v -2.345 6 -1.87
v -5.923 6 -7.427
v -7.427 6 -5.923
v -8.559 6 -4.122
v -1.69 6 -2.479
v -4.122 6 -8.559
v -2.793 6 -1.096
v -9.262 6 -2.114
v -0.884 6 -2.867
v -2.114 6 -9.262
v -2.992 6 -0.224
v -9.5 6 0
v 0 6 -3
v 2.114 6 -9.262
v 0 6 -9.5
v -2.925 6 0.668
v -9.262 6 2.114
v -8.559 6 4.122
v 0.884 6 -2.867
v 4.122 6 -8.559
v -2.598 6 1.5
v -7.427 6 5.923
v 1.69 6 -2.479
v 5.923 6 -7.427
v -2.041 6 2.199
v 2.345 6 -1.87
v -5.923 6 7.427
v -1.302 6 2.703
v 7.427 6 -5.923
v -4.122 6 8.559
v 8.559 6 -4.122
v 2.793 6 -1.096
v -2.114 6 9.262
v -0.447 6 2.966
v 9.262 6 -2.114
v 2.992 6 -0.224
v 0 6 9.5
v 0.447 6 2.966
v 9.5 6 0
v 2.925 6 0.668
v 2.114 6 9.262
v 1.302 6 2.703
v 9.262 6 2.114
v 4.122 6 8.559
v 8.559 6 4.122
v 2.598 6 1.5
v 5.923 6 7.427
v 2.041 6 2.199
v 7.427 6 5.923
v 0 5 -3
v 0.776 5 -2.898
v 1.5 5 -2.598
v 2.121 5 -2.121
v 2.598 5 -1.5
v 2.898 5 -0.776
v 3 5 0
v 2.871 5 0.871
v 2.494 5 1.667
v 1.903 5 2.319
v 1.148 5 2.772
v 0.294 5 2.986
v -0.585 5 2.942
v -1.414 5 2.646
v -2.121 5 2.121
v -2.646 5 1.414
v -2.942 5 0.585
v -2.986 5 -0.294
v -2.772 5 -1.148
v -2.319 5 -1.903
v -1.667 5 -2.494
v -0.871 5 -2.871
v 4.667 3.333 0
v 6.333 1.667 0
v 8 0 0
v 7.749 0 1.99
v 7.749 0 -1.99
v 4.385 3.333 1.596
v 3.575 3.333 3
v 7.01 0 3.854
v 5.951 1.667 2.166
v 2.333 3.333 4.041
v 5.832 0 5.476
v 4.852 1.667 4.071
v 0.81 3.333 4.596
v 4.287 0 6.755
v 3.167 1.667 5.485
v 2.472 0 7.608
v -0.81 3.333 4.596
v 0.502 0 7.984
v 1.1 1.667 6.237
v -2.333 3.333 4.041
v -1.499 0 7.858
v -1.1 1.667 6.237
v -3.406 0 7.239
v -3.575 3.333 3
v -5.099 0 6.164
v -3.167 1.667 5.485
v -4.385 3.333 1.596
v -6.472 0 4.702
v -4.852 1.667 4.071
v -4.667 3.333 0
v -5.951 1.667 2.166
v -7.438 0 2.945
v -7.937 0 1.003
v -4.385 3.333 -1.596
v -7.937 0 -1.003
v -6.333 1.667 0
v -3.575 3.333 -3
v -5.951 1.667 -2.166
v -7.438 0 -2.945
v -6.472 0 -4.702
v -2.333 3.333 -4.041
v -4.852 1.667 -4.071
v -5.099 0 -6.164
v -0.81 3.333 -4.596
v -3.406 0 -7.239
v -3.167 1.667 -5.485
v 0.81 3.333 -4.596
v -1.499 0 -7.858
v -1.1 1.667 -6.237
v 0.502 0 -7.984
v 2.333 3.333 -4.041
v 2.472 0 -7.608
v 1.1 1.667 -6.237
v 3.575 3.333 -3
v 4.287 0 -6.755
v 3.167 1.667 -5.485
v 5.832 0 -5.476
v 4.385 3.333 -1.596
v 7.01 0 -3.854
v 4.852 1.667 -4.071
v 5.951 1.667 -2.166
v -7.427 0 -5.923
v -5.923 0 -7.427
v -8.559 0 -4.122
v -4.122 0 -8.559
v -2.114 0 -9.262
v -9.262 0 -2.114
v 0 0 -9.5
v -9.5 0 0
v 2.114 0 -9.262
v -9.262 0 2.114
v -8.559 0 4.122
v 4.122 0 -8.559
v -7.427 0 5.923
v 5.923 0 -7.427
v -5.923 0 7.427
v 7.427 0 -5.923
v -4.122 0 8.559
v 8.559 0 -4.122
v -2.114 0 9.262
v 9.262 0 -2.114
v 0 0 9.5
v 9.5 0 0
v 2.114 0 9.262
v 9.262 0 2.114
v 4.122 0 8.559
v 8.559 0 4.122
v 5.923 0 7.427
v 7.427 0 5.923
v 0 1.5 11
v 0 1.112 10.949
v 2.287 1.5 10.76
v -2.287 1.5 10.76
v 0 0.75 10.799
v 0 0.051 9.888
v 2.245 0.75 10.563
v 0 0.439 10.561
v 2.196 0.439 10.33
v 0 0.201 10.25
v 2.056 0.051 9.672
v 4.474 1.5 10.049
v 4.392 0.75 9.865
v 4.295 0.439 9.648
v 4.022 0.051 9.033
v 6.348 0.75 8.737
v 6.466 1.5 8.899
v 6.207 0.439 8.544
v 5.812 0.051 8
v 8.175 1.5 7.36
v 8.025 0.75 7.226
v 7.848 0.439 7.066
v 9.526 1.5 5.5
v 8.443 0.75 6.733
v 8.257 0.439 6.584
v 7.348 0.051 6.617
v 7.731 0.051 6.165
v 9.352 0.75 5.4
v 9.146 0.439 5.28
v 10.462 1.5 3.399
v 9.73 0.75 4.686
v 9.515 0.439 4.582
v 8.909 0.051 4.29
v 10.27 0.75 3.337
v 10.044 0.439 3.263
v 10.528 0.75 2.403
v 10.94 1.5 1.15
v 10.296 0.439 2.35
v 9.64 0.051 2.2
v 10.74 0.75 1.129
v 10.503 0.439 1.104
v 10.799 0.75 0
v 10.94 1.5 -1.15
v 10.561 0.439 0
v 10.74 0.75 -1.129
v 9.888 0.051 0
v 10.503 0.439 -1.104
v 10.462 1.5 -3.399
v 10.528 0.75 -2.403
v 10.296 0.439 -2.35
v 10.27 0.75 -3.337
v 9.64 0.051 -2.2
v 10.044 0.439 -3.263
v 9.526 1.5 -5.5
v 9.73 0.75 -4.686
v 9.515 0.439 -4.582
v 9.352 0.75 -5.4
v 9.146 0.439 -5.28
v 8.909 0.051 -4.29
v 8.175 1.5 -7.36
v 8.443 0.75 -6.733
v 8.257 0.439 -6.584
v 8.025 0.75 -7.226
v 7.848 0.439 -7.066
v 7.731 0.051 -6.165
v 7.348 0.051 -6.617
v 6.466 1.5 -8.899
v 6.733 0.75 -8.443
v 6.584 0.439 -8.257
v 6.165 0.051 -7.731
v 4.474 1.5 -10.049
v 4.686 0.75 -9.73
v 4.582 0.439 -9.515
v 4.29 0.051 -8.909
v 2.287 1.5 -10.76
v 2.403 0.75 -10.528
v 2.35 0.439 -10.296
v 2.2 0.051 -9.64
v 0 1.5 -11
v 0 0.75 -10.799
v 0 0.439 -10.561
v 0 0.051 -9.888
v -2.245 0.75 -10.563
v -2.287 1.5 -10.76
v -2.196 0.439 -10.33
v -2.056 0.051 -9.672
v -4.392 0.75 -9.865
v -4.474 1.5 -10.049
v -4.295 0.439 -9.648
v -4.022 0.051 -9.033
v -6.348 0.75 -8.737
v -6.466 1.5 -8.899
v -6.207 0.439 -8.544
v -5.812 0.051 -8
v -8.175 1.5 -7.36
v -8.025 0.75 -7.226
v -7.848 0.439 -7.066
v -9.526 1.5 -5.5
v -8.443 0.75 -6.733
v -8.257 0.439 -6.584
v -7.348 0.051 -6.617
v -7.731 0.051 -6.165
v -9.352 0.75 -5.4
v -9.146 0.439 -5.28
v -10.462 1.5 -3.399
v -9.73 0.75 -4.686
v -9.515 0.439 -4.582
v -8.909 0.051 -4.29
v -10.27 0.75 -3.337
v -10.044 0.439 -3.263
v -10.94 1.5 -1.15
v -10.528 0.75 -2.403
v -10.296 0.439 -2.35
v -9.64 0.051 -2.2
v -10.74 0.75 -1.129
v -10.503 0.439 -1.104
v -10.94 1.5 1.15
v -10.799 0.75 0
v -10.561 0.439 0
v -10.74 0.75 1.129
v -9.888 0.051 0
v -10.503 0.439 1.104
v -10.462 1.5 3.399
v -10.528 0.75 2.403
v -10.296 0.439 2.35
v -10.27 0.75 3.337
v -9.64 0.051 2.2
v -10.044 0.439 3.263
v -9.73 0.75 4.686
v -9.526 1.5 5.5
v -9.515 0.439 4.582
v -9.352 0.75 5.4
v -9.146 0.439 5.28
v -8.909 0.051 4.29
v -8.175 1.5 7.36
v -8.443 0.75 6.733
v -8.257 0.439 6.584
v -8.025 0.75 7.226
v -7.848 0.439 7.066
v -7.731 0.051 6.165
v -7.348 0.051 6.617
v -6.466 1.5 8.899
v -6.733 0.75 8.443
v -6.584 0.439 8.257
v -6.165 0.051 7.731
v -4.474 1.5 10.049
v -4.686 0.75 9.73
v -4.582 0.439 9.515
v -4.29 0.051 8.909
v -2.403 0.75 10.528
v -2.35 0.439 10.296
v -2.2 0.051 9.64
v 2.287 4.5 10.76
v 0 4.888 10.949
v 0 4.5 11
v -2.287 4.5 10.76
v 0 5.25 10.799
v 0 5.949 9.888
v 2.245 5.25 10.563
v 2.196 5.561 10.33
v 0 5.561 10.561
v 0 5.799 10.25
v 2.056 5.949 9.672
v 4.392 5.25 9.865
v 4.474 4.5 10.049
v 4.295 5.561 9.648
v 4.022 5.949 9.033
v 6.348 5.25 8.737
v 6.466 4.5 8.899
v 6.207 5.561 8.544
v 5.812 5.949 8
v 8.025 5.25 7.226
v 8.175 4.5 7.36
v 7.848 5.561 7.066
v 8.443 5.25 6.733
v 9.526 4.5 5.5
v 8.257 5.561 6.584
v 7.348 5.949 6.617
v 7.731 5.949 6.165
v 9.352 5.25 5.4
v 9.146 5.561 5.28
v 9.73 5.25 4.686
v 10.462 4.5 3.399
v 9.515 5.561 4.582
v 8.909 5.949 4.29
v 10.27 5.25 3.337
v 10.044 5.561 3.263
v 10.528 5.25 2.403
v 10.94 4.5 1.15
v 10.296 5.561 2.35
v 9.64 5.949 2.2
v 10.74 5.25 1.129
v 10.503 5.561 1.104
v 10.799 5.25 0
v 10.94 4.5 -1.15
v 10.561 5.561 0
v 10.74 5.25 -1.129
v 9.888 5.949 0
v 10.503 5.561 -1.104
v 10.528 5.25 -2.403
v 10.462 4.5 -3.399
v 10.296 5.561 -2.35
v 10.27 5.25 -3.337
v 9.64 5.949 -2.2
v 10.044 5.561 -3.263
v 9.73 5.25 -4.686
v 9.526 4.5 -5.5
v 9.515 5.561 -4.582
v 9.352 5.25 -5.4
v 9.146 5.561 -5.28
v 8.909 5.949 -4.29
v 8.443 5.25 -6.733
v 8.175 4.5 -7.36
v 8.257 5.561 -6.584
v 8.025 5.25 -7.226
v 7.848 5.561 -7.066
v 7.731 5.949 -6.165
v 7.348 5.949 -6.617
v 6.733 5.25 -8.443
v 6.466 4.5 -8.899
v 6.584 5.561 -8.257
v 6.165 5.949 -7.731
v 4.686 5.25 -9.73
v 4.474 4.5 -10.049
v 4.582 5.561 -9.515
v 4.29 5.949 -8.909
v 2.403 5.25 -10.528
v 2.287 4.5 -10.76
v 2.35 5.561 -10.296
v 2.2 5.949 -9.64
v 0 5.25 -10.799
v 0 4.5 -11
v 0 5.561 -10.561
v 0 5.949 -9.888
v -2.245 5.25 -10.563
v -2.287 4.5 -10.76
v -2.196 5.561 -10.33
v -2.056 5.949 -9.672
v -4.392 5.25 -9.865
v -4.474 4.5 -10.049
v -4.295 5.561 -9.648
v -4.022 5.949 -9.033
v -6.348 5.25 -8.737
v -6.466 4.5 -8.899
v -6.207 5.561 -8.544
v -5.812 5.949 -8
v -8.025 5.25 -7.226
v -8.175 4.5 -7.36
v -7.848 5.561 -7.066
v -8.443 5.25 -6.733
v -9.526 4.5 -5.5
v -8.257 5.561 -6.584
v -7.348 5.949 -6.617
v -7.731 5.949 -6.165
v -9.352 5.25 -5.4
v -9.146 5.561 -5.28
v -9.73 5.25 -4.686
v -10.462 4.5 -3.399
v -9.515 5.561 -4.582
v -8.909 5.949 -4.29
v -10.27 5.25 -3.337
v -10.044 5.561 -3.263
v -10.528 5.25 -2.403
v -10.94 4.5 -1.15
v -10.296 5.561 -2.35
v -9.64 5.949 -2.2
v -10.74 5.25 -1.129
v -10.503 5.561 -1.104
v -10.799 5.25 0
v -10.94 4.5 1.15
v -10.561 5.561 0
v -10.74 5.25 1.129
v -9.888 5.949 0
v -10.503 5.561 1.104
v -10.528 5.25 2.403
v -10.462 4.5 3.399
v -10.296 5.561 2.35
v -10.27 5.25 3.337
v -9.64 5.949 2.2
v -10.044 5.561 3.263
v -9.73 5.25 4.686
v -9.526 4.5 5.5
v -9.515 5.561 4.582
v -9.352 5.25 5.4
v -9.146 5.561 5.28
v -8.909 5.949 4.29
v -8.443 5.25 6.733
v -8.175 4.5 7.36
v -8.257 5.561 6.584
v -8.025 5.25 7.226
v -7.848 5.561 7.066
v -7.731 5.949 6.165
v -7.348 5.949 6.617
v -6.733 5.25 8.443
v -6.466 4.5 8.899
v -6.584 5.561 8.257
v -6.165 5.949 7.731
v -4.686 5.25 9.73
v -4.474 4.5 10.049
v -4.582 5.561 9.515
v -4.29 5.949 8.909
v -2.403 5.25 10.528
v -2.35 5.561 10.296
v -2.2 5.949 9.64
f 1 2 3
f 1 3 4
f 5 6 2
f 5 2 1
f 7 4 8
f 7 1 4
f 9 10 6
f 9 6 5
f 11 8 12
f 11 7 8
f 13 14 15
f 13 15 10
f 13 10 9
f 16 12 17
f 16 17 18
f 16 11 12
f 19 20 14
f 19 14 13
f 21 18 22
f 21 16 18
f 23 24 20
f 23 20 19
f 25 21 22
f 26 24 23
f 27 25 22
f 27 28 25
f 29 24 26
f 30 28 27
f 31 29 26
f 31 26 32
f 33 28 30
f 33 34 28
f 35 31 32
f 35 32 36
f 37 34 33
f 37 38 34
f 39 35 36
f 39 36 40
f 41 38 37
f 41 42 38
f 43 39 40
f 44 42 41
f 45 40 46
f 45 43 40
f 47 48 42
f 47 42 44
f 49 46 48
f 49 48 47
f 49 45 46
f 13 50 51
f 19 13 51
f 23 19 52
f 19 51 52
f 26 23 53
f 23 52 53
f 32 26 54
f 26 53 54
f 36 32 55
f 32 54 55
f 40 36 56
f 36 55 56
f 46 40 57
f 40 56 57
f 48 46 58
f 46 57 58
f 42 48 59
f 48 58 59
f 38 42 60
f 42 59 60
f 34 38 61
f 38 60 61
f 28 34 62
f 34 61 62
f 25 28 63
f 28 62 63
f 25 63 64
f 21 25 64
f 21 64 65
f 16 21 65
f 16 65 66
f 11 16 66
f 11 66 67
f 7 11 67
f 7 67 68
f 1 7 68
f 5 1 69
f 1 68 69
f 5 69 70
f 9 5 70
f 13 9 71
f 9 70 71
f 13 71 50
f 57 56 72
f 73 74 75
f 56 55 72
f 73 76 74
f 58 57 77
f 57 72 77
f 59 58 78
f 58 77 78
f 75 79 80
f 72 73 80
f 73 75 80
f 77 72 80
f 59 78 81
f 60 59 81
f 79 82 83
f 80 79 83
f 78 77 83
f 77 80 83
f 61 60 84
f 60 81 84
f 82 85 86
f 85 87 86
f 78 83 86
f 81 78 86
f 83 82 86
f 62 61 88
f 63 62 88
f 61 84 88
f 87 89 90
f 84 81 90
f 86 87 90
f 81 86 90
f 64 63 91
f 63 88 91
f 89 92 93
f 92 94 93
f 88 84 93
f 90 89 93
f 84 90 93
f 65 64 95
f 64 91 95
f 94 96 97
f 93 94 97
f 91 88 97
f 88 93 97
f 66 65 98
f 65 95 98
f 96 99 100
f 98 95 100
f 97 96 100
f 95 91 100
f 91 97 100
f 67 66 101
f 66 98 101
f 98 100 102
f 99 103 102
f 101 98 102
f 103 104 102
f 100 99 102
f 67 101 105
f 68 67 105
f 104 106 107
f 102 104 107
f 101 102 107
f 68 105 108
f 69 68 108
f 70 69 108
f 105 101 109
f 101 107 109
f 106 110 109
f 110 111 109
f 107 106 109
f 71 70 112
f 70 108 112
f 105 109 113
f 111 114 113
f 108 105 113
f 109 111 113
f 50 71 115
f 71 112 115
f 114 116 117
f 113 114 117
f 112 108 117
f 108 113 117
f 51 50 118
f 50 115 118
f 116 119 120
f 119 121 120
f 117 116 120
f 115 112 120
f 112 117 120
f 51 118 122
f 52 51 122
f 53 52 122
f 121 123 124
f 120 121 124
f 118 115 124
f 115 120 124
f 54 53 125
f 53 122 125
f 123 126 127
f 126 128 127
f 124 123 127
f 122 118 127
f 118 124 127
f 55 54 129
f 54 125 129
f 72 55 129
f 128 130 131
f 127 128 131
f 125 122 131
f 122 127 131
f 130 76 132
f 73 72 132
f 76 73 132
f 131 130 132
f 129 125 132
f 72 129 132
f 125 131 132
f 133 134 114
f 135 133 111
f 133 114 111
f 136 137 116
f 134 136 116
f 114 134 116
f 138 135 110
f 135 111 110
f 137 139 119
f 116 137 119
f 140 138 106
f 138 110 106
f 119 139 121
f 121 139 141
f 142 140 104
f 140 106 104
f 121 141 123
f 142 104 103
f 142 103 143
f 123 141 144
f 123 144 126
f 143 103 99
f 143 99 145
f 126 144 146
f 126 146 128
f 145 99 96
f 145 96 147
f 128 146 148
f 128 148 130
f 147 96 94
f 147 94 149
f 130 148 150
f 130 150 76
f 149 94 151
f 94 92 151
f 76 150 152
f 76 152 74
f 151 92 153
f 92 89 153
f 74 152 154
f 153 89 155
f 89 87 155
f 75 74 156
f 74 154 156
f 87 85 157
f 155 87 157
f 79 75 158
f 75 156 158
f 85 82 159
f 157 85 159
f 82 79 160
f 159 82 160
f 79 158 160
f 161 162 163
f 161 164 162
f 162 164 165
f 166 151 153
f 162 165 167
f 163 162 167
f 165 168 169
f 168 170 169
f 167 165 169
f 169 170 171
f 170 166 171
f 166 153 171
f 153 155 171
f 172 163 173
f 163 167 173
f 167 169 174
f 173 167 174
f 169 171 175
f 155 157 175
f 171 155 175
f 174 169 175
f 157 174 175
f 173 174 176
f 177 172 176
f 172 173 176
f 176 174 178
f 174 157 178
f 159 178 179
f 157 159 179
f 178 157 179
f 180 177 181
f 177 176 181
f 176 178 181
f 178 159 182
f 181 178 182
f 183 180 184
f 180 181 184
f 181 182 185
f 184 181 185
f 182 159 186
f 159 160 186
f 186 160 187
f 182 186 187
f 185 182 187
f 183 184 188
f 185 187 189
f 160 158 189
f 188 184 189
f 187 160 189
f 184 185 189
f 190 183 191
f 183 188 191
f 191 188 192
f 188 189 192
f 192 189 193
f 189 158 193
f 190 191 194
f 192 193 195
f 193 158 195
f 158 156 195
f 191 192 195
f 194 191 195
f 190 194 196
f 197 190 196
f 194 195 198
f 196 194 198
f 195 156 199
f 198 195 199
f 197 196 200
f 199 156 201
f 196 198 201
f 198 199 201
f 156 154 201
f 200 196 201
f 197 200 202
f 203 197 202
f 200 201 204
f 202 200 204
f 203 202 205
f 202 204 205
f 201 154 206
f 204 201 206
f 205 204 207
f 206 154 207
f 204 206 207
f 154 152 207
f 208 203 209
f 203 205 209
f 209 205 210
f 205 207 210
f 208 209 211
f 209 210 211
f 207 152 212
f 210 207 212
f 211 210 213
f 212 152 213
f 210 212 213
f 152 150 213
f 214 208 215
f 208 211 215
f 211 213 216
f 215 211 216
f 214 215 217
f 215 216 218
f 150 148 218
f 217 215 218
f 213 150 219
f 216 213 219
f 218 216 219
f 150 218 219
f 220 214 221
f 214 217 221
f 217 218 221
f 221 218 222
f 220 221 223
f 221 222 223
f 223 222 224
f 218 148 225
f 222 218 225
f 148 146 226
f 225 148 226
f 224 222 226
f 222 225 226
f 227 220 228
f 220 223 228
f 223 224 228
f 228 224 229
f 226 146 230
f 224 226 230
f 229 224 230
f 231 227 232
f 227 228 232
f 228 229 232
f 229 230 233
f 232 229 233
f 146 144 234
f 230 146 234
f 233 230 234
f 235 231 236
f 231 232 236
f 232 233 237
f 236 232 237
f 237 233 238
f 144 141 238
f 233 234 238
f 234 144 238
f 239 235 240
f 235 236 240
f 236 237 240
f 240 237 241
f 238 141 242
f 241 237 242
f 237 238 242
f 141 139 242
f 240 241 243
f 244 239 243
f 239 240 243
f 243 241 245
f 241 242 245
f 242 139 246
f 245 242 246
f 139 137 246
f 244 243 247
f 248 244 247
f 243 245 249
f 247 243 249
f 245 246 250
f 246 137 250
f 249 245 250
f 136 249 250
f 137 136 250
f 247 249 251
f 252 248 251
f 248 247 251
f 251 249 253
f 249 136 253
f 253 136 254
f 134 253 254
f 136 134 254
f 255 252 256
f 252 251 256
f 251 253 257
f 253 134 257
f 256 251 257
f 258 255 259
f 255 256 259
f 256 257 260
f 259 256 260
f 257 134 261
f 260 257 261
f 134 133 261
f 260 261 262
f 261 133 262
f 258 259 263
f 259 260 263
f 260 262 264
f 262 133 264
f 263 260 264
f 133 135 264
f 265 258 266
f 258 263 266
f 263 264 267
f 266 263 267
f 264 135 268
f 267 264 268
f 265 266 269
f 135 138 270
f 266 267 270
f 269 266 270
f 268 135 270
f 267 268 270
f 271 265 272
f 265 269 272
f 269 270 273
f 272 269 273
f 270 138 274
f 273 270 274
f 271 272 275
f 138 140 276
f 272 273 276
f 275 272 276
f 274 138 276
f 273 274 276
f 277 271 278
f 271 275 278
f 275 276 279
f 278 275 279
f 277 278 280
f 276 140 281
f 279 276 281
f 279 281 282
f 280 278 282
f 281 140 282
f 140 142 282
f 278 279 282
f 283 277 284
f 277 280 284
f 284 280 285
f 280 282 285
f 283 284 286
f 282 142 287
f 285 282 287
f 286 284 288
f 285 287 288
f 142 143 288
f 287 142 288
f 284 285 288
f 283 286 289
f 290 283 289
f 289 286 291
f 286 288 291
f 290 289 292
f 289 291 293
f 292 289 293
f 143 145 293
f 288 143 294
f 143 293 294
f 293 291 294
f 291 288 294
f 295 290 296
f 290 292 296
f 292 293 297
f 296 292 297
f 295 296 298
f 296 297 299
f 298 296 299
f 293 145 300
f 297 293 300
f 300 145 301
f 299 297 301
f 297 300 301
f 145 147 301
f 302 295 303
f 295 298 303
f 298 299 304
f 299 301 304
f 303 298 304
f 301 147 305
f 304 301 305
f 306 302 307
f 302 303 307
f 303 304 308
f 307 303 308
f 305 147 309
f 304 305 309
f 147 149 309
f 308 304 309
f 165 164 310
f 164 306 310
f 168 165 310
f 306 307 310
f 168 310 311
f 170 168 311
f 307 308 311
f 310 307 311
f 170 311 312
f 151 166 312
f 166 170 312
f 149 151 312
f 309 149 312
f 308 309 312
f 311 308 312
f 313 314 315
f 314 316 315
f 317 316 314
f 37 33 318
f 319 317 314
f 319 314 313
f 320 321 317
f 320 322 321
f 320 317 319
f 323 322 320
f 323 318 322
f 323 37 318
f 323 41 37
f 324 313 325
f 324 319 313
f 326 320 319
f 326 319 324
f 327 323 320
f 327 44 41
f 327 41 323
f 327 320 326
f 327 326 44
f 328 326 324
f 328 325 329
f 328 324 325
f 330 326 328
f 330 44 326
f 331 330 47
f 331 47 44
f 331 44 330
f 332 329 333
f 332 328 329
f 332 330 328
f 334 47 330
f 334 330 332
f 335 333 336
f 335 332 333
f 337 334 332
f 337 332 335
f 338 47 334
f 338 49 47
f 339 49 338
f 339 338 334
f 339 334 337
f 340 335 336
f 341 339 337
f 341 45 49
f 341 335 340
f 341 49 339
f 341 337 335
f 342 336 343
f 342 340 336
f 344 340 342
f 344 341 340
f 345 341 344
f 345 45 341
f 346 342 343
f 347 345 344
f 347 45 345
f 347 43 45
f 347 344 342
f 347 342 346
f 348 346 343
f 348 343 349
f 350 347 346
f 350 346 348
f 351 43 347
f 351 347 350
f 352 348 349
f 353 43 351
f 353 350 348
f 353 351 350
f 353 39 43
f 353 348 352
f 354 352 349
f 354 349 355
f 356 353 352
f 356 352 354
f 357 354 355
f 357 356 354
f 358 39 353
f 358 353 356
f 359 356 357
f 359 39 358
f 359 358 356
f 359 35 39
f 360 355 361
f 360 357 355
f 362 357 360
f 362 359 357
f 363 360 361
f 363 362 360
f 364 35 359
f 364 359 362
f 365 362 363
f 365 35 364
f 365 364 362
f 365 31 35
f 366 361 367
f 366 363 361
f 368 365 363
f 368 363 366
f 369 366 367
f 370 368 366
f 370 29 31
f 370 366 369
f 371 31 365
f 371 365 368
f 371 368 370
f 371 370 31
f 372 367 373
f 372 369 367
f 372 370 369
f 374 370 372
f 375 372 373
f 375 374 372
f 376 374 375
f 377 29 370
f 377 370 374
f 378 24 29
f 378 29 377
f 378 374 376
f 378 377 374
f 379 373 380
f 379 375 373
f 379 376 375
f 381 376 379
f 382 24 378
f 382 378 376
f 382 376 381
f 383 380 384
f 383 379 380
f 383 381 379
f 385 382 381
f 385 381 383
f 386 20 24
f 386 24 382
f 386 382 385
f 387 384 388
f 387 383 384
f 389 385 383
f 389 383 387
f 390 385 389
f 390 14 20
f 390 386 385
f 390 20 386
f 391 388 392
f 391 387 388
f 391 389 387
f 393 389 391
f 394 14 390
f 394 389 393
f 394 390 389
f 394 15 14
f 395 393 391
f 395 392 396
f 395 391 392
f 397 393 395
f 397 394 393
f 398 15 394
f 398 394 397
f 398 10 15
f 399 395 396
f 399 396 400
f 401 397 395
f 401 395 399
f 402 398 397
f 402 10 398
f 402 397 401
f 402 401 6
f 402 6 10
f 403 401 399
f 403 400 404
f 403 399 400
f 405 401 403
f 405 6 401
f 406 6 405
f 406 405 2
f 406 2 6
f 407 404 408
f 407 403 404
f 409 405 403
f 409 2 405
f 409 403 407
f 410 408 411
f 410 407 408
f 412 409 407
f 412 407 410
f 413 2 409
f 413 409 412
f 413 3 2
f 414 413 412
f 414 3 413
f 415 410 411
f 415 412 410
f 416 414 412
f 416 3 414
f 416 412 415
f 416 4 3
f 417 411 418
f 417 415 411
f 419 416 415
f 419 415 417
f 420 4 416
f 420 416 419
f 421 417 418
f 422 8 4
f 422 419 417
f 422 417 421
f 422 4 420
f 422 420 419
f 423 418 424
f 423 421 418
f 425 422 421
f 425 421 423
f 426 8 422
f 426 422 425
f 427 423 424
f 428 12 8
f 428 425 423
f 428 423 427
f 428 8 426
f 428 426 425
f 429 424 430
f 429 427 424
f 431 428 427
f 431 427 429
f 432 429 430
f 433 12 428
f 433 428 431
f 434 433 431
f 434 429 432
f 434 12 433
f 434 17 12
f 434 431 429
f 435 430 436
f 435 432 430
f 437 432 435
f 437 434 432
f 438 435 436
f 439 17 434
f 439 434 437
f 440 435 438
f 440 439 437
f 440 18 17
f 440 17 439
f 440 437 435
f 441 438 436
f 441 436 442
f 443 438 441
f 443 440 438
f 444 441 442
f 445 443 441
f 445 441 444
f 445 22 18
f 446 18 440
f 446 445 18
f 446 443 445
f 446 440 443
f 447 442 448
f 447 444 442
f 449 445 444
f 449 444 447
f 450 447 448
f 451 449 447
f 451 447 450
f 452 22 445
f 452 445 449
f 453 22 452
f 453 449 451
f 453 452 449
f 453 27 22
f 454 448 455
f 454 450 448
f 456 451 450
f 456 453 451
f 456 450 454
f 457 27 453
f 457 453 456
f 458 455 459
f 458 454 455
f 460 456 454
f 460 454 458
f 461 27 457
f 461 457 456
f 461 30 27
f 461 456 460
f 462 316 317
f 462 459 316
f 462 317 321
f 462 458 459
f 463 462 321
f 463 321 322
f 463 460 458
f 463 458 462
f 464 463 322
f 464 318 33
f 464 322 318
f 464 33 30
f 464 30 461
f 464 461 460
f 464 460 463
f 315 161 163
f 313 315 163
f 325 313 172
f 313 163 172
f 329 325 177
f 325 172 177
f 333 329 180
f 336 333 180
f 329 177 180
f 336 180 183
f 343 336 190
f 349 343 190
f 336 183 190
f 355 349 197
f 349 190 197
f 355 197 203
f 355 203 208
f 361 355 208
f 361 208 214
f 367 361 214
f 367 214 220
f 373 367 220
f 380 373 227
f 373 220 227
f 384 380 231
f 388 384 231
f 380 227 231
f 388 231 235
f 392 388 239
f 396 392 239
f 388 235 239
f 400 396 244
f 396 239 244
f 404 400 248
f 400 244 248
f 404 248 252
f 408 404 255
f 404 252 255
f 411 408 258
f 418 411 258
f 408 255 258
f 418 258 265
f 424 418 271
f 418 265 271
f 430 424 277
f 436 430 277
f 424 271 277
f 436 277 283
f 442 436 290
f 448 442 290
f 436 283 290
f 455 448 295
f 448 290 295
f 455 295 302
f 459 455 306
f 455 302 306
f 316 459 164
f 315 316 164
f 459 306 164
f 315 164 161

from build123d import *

# Parameters (mm, degrees)
ESBO_O1_R                = 11
RESSALTO_EXTRUS_O1_DEPTH = 6
ESBO_O10_R               = 8
CORTE_EXTRUS_O4_DEPTH    = 5
CORTE_EXTRUS_O4_DRAFT    = -45
ESBO_O11_R               = 3
CORTE_EXTRUS_O5_DEPTH    = 17.340134638
FILETE4_R                = 1.5
FILETE5_R                = 1.5


with BuildPart() as part:
    # Esboço1 → Ressalto-extrusão1 (new body)
    with BuildSketch(Plane(origin=(0, 0, 0), x_dir=(1, 0, 0), z_dir=(0, 1, 0))):
        with Locations(Location((0, 0, 0), (0, 0, 270))):
            Circle(ESBO_O1_R)
    extrude(amount=RESSALTO_EXTRUS_O1_DEPTH)


with BuildPart() as corte_extrus_o4_tool:
    # Esboço10 → Corte-extrusão4 (with draft: the straight prism first)
    with BuildSketch(Plane.XZ):
        Circle(ESBO_O10_R)
    extrude(amount=-CORTE_EXTRUS_O4_DEPTH)
    # Corte-extrusão4: the draft: its side faces are tilted about the plane it starts from
    corte_extrus_o4_sides = [corte_extrus_o4_tool.faces().sort_by_distance(p)[0] for p in [
        (-8, 2.5, 0),
    ]]
    draft(corte_extrus_o4_sides, Plane.XZ, CORTE_EXTRUS_O4_DRAFT)


with BuildPart() as part_1:
    add(part.part)

    # Corte-extrusão4: cut by corte_extrus_o4_tool
    add(corte_extrus_o4_tool.part, mode=Mode.SUBTRACT)

    # Esboço11 → Corte-extrusão5 (cut, through all)
    with BuildSketch(Plane.XZ.offset(-5)):
        with Locations(Location((0, 0, 0), (0, 0, 270))):
            Circle(ESBO_O11_R)
    extrude(amount=-CORTE_EXTRUS_O5_DEPTH, mode=Mode.SUBTRACT)

    # Filete4
    filete4_edges = [part_1.edges().sort_by_distance(p)[0] for p in [
        (0, 0, -11),
    ]]
    fillet(filete4_edges, radius=FILETE4_R)

    # Filete5
    filete5_edges = [part_1.edges().sort_by_distance(p)[0] for p in [
        (0, 6, -11),
    ]]
    fillet(filete5_edges, radius=FILETE5_R)


solid = part_1.part
